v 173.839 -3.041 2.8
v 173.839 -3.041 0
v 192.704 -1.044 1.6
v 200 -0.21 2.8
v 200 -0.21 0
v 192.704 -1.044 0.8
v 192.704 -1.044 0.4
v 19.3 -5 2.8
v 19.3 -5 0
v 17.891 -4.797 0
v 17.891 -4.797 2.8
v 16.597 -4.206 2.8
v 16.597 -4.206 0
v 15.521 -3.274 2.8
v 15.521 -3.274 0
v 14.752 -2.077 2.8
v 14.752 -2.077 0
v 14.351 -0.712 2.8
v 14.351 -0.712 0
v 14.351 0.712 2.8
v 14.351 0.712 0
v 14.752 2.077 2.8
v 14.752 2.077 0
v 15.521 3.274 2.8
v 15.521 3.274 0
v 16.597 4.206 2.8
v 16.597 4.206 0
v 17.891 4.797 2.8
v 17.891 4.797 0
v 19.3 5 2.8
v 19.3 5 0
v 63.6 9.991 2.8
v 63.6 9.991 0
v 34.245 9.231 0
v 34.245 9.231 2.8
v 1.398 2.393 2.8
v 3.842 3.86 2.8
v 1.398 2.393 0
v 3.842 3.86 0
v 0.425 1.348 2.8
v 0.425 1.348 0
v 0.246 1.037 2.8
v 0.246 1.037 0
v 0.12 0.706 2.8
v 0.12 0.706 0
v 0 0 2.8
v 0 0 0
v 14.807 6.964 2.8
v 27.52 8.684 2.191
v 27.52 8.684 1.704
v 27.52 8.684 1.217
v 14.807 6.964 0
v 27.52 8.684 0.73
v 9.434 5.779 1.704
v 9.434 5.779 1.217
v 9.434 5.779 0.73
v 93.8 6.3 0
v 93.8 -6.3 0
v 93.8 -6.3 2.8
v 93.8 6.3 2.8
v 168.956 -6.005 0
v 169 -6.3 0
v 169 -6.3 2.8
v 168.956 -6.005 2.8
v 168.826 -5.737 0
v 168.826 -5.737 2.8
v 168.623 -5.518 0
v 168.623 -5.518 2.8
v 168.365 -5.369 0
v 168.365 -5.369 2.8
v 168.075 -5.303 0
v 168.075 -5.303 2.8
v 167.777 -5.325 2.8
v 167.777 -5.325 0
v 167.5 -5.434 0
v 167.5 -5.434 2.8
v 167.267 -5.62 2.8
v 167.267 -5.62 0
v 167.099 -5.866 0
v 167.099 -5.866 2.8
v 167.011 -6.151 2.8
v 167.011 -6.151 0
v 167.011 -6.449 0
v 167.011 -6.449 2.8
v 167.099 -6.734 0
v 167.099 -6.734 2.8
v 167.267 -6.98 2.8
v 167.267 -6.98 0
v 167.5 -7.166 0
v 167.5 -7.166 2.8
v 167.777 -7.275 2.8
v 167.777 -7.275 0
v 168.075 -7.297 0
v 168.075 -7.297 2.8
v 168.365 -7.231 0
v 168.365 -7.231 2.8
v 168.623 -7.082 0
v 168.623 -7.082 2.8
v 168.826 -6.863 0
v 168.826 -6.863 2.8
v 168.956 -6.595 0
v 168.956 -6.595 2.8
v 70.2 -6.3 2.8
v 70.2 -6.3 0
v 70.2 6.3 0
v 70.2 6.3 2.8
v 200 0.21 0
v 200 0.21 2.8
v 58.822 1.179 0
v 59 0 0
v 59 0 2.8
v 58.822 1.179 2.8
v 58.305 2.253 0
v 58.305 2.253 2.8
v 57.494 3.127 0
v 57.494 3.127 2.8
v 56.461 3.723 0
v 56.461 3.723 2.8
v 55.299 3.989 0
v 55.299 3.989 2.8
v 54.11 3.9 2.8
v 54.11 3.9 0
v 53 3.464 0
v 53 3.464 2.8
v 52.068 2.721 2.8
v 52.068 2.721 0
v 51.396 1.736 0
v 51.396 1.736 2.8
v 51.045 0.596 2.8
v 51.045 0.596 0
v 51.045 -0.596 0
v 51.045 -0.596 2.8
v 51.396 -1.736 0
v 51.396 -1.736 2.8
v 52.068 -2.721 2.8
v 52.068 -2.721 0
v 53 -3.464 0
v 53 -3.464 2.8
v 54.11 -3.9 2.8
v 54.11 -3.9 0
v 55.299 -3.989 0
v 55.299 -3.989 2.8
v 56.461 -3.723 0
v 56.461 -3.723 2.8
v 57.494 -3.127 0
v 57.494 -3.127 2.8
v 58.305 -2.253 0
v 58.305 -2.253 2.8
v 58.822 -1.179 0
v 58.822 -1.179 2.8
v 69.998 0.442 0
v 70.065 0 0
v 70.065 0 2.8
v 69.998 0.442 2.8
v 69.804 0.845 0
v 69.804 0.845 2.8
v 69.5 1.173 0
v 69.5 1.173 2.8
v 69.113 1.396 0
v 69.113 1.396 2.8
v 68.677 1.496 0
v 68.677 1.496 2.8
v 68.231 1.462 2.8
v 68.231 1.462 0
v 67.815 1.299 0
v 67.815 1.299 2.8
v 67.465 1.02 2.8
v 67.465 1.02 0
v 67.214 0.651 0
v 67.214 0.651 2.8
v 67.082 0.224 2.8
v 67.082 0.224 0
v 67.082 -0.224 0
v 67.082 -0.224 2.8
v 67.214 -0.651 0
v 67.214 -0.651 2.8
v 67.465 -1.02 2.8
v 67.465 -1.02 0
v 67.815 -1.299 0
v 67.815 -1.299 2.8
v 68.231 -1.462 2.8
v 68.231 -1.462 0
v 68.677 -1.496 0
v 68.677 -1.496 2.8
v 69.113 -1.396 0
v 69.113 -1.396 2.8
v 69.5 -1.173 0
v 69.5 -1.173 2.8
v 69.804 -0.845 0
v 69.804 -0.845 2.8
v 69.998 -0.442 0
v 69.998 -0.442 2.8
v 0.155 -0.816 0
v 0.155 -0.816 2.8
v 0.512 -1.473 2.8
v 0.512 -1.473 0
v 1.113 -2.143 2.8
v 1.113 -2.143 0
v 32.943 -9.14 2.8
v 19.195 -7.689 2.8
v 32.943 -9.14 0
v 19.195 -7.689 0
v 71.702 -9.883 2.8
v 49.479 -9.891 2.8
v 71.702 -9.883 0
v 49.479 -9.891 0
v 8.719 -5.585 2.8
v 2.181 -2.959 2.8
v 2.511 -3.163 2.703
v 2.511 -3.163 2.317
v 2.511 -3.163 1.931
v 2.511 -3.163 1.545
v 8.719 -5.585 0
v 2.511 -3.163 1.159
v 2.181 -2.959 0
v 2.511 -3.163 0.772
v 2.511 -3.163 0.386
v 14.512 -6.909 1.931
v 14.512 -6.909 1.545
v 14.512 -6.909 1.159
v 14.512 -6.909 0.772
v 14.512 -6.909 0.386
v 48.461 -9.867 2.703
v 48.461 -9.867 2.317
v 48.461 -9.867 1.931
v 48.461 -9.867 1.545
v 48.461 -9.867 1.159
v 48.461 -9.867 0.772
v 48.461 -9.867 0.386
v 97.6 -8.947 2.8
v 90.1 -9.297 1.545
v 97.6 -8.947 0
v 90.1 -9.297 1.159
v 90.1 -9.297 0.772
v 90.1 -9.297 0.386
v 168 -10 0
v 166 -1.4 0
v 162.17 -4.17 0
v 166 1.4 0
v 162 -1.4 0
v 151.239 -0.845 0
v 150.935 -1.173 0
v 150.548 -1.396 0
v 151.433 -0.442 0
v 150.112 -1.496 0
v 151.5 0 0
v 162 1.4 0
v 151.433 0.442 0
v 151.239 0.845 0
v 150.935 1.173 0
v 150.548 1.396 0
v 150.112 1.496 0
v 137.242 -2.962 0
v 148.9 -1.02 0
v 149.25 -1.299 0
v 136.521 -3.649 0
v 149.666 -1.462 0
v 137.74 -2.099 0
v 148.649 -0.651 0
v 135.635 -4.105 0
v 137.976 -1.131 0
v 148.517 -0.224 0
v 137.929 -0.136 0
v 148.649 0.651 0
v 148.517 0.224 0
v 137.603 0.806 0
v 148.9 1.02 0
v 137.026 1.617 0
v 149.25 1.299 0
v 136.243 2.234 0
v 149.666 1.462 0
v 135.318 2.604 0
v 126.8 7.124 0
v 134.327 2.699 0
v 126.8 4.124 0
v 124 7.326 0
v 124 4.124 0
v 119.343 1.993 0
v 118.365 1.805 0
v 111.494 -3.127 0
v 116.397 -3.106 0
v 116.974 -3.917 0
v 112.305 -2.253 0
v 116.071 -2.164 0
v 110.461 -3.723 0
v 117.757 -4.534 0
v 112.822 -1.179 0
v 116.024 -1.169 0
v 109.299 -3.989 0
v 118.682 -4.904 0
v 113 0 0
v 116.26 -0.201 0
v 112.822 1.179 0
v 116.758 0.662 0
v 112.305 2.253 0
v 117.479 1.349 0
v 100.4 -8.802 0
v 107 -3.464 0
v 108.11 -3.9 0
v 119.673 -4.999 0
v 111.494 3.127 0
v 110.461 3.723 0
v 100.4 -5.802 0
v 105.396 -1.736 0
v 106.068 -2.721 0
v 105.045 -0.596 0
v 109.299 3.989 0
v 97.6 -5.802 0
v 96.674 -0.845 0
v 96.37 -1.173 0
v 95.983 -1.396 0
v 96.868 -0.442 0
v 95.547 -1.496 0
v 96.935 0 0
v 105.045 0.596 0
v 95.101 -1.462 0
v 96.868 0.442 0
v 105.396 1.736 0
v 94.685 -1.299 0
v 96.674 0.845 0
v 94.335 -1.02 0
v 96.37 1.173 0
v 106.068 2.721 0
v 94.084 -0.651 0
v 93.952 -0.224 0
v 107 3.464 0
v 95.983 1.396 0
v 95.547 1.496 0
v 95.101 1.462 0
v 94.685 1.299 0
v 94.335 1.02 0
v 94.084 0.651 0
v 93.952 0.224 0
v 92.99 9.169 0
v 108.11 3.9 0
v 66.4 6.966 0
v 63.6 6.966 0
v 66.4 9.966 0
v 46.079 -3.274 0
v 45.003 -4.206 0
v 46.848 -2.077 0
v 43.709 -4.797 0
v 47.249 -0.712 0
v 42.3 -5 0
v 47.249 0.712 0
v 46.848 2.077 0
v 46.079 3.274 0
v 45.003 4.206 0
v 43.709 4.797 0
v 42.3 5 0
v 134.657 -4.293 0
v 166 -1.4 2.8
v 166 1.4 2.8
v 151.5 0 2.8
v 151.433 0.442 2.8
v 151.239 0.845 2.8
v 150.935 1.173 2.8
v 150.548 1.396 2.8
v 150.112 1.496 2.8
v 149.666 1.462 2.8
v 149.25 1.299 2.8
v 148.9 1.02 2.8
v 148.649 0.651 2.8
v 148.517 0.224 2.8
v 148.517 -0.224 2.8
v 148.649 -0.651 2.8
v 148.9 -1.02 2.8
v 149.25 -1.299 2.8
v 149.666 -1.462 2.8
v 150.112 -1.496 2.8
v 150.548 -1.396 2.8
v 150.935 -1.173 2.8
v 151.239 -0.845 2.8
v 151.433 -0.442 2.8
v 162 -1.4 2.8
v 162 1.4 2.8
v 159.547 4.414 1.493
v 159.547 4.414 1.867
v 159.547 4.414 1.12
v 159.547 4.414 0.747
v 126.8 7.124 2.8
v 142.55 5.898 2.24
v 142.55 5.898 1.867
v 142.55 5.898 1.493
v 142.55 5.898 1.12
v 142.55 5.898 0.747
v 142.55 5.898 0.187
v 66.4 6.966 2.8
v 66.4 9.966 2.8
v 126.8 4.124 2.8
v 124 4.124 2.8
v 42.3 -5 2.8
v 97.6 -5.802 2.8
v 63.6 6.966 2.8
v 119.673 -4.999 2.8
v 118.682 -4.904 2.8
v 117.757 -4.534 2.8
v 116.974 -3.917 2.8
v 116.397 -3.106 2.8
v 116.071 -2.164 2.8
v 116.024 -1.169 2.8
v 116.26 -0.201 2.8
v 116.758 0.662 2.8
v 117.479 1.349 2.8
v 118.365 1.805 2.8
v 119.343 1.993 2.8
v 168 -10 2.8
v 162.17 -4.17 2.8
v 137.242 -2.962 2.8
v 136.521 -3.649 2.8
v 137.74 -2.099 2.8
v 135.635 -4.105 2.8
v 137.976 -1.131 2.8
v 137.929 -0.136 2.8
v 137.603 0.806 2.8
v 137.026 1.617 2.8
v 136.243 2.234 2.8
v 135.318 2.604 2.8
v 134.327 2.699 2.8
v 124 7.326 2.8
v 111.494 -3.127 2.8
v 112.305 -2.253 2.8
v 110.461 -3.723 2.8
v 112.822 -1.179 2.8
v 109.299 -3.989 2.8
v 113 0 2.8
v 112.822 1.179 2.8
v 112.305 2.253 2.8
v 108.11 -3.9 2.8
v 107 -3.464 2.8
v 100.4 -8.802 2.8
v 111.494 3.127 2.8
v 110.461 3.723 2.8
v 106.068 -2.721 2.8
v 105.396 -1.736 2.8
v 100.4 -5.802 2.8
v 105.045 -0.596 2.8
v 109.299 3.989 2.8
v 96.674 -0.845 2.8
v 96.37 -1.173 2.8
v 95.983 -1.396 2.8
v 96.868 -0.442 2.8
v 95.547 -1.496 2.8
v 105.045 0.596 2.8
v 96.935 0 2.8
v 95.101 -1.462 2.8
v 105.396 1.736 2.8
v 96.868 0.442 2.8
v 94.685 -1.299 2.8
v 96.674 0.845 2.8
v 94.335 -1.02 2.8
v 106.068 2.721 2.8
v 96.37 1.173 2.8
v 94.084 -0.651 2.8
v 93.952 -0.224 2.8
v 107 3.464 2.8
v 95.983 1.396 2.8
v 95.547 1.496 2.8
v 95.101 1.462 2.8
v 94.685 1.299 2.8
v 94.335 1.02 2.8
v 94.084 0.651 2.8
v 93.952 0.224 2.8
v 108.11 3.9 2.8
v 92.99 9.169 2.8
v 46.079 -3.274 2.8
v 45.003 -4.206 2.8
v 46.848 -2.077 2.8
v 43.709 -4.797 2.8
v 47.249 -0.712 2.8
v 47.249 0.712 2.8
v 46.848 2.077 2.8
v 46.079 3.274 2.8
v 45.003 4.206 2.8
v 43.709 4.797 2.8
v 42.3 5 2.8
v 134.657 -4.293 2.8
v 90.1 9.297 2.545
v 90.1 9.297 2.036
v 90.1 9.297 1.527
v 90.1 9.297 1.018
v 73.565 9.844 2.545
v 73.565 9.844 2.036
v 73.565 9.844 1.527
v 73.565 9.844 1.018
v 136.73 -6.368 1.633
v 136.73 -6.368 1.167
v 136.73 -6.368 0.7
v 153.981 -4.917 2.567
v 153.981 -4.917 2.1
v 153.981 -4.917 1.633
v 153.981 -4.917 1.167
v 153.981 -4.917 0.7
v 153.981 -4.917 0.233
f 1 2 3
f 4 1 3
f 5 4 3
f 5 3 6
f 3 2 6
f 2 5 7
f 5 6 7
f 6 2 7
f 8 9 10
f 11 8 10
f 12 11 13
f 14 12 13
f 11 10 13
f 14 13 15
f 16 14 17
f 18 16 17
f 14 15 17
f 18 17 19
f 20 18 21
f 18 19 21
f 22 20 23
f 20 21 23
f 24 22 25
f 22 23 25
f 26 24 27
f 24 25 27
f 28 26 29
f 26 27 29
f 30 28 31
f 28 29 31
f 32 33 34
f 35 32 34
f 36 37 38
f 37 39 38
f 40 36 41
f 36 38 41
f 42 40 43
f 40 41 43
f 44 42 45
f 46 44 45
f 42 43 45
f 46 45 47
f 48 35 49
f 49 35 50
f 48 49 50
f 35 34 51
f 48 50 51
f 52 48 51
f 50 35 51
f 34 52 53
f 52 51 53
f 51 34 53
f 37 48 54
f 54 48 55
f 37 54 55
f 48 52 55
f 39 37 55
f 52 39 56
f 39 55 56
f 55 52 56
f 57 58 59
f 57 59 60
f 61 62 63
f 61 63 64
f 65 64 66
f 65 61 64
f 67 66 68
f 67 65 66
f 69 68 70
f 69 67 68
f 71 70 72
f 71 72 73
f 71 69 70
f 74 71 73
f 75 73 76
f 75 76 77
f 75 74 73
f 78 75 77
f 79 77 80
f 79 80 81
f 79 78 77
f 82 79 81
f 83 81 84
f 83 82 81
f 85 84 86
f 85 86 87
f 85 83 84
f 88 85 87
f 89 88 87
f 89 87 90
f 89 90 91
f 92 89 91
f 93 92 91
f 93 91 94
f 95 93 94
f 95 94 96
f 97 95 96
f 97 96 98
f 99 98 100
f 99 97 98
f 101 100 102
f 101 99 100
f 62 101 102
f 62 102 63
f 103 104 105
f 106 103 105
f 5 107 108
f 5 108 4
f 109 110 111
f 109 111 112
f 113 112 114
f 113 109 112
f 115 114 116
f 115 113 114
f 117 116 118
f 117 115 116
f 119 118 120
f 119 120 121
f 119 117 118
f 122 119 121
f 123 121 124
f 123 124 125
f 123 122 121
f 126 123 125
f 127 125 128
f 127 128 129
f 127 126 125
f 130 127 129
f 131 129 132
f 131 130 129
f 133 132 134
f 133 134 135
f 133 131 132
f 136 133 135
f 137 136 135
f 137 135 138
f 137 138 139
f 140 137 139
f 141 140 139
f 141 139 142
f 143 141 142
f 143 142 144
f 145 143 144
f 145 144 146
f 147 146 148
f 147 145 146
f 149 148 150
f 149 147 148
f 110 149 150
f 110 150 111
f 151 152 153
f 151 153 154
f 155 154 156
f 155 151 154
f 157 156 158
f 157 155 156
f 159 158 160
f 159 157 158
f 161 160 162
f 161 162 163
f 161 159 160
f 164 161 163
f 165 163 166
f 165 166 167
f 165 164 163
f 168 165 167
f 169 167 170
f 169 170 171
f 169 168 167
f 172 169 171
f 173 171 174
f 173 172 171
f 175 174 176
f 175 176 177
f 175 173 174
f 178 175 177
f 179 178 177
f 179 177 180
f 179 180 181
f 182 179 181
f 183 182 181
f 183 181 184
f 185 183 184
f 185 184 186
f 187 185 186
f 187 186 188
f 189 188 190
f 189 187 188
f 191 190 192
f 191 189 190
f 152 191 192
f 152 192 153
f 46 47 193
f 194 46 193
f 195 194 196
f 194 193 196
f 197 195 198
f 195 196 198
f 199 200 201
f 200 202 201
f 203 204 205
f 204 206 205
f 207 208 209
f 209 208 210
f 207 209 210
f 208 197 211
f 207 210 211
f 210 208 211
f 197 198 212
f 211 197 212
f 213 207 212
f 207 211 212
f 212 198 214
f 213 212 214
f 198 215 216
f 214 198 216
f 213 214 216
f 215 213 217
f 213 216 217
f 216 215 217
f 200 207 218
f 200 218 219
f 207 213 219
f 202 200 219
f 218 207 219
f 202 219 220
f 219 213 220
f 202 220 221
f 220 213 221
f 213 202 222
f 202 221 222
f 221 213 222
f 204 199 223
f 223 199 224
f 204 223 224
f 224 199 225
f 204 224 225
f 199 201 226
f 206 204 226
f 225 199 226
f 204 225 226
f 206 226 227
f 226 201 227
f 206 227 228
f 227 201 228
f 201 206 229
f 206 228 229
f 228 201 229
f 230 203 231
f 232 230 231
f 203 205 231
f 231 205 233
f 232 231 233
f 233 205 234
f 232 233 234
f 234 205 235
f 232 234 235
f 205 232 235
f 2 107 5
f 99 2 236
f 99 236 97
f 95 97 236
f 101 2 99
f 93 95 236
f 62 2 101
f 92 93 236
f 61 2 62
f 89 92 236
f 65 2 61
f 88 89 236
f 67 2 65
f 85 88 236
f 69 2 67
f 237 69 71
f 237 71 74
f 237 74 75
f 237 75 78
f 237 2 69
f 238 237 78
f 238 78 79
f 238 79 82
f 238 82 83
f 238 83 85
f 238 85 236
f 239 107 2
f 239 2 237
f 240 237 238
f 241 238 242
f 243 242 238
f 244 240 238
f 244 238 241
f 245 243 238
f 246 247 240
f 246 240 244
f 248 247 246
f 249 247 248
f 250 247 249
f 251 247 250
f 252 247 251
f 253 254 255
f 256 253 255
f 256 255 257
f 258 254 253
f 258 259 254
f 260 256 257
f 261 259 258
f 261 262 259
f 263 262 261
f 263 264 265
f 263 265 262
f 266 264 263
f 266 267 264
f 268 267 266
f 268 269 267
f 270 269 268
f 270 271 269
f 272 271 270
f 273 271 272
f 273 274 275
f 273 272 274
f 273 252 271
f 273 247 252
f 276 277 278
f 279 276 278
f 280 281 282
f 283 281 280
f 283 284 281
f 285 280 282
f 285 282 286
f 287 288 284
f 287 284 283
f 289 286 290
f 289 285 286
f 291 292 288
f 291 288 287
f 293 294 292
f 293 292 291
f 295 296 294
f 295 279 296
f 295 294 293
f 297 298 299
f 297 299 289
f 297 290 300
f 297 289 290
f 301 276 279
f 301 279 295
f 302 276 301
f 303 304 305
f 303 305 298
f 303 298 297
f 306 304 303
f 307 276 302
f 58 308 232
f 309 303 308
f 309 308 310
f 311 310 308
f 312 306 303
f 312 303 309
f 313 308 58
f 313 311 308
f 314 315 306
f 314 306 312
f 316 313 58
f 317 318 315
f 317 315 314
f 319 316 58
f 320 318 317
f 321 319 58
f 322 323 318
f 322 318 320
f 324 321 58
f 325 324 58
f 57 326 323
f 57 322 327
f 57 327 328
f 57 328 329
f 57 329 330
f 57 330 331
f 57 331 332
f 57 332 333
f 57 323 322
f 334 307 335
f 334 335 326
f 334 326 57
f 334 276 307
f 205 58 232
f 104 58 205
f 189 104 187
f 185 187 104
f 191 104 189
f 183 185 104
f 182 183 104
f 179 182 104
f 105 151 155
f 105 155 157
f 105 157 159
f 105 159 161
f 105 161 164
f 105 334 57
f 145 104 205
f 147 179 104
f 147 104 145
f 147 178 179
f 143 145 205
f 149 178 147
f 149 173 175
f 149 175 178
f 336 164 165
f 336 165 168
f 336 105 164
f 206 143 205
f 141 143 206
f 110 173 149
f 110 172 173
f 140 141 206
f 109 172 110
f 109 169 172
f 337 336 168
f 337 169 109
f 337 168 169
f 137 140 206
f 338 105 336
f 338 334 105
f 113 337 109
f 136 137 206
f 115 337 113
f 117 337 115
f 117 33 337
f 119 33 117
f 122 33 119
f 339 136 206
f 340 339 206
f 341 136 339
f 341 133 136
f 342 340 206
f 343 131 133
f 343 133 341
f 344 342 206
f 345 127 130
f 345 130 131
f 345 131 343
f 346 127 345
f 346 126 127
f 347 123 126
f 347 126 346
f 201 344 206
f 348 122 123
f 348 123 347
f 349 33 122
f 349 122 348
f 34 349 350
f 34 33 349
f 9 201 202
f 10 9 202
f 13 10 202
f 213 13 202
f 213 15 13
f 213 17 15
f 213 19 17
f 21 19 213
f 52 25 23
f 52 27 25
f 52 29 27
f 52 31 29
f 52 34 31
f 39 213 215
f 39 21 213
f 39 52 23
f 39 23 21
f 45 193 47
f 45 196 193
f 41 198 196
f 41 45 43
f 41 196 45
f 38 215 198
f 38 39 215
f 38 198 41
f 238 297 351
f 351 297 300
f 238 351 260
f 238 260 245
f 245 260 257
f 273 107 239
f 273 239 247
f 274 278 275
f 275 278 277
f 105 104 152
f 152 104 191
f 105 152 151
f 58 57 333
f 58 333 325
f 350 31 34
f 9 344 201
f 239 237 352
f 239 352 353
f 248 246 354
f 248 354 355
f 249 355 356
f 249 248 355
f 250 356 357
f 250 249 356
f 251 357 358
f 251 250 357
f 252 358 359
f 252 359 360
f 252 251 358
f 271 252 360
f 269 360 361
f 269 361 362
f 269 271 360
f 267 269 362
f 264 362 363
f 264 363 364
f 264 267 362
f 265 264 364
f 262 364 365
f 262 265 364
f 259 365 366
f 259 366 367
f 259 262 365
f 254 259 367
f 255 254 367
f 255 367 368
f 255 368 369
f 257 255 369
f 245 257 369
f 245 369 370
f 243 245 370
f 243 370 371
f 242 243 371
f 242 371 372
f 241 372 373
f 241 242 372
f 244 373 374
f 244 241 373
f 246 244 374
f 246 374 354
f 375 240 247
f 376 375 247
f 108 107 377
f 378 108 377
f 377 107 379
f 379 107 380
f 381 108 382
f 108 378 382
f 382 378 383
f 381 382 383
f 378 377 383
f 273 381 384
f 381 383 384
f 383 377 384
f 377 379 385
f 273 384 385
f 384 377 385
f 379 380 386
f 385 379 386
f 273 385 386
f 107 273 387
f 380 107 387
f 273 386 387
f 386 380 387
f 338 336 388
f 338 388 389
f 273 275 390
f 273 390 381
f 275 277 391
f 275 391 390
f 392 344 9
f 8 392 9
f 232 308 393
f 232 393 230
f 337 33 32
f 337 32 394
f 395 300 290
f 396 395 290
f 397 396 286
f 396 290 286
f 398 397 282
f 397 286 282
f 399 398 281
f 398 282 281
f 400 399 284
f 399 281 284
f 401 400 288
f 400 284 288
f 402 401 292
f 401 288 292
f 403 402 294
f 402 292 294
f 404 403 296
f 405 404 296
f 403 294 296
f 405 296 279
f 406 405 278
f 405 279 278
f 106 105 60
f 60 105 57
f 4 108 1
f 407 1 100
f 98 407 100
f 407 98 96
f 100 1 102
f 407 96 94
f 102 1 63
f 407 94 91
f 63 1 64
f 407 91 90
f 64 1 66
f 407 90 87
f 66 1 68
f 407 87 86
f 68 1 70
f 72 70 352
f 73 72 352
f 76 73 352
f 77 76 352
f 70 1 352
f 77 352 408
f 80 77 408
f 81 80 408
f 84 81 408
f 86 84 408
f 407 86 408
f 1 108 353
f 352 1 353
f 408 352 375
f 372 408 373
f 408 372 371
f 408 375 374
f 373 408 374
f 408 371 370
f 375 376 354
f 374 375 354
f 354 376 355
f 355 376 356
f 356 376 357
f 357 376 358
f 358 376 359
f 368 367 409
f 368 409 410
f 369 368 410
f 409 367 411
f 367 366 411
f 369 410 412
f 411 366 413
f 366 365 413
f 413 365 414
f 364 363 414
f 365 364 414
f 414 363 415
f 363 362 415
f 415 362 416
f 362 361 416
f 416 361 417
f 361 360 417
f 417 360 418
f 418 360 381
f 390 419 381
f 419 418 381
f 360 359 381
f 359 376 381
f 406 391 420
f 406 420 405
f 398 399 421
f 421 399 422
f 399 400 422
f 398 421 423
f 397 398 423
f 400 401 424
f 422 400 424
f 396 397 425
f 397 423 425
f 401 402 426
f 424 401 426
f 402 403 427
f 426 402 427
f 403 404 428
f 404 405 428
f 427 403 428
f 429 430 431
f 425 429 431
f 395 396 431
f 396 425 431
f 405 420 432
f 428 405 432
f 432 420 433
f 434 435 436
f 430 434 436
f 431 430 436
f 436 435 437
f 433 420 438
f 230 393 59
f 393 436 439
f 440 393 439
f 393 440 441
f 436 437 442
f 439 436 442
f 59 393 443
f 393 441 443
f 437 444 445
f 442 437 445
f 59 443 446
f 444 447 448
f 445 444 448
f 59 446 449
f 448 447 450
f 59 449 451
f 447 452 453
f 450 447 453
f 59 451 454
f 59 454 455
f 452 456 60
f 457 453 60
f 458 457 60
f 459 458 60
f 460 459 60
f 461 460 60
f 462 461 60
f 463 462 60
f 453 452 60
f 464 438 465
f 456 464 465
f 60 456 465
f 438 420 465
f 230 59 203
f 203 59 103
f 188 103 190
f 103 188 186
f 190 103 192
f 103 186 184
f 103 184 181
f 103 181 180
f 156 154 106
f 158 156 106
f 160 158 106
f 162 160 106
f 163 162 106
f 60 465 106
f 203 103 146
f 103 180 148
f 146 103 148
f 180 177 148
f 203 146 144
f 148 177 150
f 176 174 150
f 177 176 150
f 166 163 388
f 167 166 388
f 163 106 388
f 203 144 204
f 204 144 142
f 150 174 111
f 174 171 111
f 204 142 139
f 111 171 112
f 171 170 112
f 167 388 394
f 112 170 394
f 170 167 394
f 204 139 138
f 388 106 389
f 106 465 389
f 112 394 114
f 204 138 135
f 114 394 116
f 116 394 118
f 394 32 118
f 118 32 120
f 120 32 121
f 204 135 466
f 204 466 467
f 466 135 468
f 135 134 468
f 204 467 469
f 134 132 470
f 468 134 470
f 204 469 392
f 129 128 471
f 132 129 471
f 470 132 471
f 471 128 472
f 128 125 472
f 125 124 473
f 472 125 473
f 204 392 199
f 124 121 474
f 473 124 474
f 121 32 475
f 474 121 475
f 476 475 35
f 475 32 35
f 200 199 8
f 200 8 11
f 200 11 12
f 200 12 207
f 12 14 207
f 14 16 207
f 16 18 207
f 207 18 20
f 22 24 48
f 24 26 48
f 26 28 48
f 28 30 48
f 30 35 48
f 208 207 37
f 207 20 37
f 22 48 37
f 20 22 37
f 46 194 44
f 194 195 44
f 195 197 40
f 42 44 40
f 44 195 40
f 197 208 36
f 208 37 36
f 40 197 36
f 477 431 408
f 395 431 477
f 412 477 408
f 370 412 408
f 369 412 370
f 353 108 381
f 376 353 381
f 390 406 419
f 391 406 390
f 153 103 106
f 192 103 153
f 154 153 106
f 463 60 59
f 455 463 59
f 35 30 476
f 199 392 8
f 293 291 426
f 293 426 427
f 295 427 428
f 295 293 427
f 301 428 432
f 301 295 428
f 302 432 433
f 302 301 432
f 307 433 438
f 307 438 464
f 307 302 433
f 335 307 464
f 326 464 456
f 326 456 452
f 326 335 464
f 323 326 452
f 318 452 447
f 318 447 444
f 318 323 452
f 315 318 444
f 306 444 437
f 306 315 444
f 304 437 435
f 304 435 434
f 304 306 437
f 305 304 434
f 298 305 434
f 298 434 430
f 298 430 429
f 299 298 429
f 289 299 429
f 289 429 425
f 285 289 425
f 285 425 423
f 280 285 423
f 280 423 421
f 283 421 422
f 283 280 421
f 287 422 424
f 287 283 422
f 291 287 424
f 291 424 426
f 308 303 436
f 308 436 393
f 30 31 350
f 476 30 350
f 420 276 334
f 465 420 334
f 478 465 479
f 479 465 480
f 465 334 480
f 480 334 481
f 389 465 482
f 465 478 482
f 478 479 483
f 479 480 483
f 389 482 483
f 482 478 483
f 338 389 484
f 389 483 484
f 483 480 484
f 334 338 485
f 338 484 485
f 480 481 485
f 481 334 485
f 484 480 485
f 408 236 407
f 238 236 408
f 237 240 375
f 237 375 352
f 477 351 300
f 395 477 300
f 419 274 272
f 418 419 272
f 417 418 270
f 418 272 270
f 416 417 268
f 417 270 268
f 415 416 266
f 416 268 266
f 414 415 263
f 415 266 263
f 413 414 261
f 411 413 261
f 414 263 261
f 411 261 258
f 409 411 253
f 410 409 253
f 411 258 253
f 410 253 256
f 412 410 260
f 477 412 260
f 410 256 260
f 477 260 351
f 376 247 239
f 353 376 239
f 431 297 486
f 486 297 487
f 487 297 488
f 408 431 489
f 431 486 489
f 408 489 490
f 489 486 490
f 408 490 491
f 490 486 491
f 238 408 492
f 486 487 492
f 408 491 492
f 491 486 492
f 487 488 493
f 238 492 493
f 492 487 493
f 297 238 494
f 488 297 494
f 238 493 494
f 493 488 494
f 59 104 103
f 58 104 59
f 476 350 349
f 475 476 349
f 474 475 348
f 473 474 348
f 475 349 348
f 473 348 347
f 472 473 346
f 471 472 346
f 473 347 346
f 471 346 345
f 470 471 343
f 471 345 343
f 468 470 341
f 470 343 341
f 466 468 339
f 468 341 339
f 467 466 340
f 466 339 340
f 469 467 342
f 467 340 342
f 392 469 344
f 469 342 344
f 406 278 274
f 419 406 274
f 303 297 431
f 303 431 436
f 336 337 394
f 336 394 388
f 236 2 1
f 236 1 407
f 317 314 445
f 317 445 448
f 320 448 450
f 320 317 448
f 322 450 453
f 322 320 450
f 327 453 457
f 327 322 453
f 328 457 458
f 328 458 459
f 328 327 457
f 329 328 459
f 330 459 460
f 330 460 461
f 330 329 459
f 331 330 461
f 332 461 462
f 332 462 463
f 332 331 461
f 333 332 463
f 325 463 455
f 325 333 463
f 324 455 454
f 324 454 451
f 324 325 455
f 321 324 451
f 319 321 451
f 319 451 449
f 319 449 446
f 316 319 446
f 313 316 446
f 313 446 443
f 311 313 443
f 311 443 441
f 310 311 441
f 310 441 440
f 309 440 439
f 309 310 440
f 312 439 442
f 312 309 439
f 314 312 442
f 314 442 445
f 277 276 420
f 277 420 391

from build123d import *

# Parameters (mm, degrees)
SKETCH_3_R      = 4
SKETCH_3_R_2    = 1.5
SKETCH_3_R_3    = 1
SKETCH_3_W      = 23.6
SKETCH_3_H      = 12.6
SKETCH_3_W_2    = 4
SKETCH_3_H_2    = 2.8
EXTRUDE_3_DEPTH = 2.8


with BuildPart() as part:
    # Эскиз3 → Бобышка-Вытянуть3 (new body)
    with BuildSketch(Plane.XY):
        with BuildLine():
            Line((200, 0.21), (200, -0.21))
            add(Edge.make_bspline(
                [(173.839461144, -3.040801203), (175.943333039, -2.830170954), (179.564023078, -2.461029339), (184.58704572, -1.932479181), (188.771568451, -1.480695182), (192.530784687, -1.065063842), (195.747560944, -0.701689979), (198.179524953, -0.422303954), (199.520051416, -0.265971644), (200, -0.21)],
                knots=[0.870307302, 0.870307302, 0.870307302, 0.870307302, 0.901571134, 0.924121062, 0.944988816, 0.963803939, 0.980044339, 0.992855276, 1, 1, 1, 1], degree=3))
            Line((173.839461144, -3.040801203), (168, -10))
            Line((168, -10), (162.170244806, -4.170244806))
            add(Edge.make_bspline(
                [(100.4, -8.802264), (100.782530515, -8.78200637), (103.102887785, -8.657921344), (107.374551667, -8.416266925), (113.223109349, -8.057497647), (119.097620698, -7.671146294), (124.98256269, -7.259840679), (130.861479372, -6.826169971), (136.716836604, -6.372892076), (142.52985565, -5.902766003), (148.280267017, -5.418602057), (153.94609331, -4.923426646), (158.566687276, -4.50520567), (161.295968592, -4.251994411), (162.170244806, -4.170244806)],
                knots=[0.507199784, 0.507199784, 0.507199784, 0.507199784, 0.512863887, 0.541558094, 0.570462313, 0.599504248, 0.628607349, 0.657690446, 0.686667237, 0.715444849, 0.743923546, 0.77199483, 0.799540253, 0.812523886, 0.812523886, 0.812523886, 0.812523886], degree=3))
            Line((100.4, -8.802264), (100.4, -5.802264))
            Line((100.4, -5.802264), (97.6, -5.802264))
            Line((97.6, -5.802264), (97.6, -8.946938935))
            add(Edge.make_bspline(
                [(0, 0), (0.032444913, -0.278495812), (0.100633198, -0.863800259), (0.62379252, -1.678905598), (1.407454518, -2.445359098), (2.48215991, -3.178007515), (3.831515725, -3.88154028), (5.45639967, -4.556541724), (7.350195056, -5.201638101), (9.507426038, -5.81478546), (11.921305119, -6.393879384), (14.58489291, -6.936612431), (17.490877441, -7.44078362), (20.631718928, -7.904294519), (23.999672572, -8.325205071), (27.586779877, -8.701741845), (31.384869897, -9.032475932), (35.385580653, -9.316092874), (39.580313292, -9.551735955), (43.960263434, -9.738807032), (48.51637403, -9.877065972), (53.239340889, -9.96650448), (58.119580475, -10.007674079), (63.147232299, -10.001179647), (68.312112852, -9.948180779), (73.603706202, -9.849984193), (79.011121778, -9.708185508), (84.52309051, -9.524657051), (90.127882502, -9.301433286), (94.497039971, -9.101072496), (96.996632606, -8.97732649), (97.6, -8.946938935)],
                knots=[0, 0, 0, 0, 0.004099011, 0.008614742, 0.013934855, 0.020277775, 0.027752981, 0.036410215, 0.046266433, 0.057320238, 0.069558946, 0.082962861, 0.097507218, 0.113164082, 0.12990269, 0.147690304, 0.166492185, 0.186271967, 0.206991861, 0.228612215, 0.251092165, 0.274388983, 0.298458209, 0.323253842, 0.348727971, 0.374830387, 0.40150919, 0.428710016, 0.456376154, 0.484448083, 0.493380908, 0.493380908, 0.493380908, 0.493380908], degree=3))
            add(Edge.make_bspline(
                [(63.6, 9.990751447), (63.433767139, 9.991846739), (61.590618822, 10.003190391), (58.119580475, 10.007674079), (53.239340889, 9.96650448), (48.51637403, 9.877065972), (43.960263434, 9.738807032), (39.580313292, 9.551735955), (35.385580653, 9.316092874), (31.384869897, 9.032475932), (27.586779877, 8.701741845), (23.999672572, 8.325205071), (20.631718928, 7.904294519), (17.490877441, 7.44078362), (14.58489291, 6.936612431), (11.921305119, 6.393879384), (9.507426038, 5.81478546), (7.350195056, 5.201638101), (5.45639967, 4.556541724), (3.831515725, 3.88154028), (2.48215991, 3.178007515), (1.407454518, 2.445359098), (0.62379252, 1.678905598), (0.100633198, 0.863800259), (0.032444913, 0.278495812), (0, 0)],
                knots=[0.674288155, 0.674288155, 0.674288155, 0.674288155, 0.676746158, 0.701541791, 0.725611017, 0.748907835, 0.771387785, 0.793008139, 0.813728033, 0.833507815, 0.852309696, 0.87009731, 0.886835918, 0.902492782, 0.917037139, 0.930441054, 0.942679762, 0.953733567, 0.963589785, 0.972247019, 0.979722225, 0.986065145, 0.991385258, 0.995900989, 1, 1, 1, 1], degree=3))
            Line((63.6, 9.990751447), (63.6, 6.965595937))
            Line((63.6, 6.965595937), (66.4, 6.965595937))
            Line((66.4, 6.965595937), (66.4, 9.965595937))
            add(Edge.make_bspline(
                [(124, 7.326294797), (122.364596134, 7.442700413), (118.769611386, 7.692718614), (113.223109349, 8.057497647), (107.374551667, 8.416266925), (101.566628903, 8.744829808), (95.813307617, 9.040711105), (90.127882502, 9.301433286), (84.52309051, 9.524657051), (79.011121778, 9.708185508), (73.603706202, 9.849984193), (69.41154014, 9.927778606), (67.023185068, 9.958531818), (66.4, 9.965595937)],
                knots=[0.376253135, 0.376253135, 0.376253135, 0.376253135, 0.400495752, 0.429537687, 0.458441906, 0.487136113, 0.515551917, 0.543623846, 0.571289984, 0.59849081, 0.625169613, 0.651272029, 0.660487149, 0.660487149, 0.660487149, 0.660487149], degree=3))
            Line((124, 7.326294797), (124, 4.124412105))
            Line((124, 4.124412105), (126.8, 4.124412105))
            Line((126.8, 4.124412105), (126.8, 7.124412105))
            add(Edge.make_bspline(
                [(200, 0.21), (199.520051416, 0.265971644), (198.179524953, 0.422303954), (195.747560944, 0.701689979), (192.530784687, 1.065063842), (188.771568451, 1.480695182), (184.58704572, 1.932479181), (180.05616868, 2.409243063), (175.238405485, 2.90257428), (168.371896377, 3.585728287), (161.260104983, 4.261418012), (153.94609331, 4.923426646), (148.280267017, 5.418602057), (142.52985565, 5.902766003), (136.716836604, 6.372892076), (131.466708661, 6.779317653), (128.156255998, 7.025385403), (126.8, 7.124412105)],
                knots=[0, 0, 0, 0, 0.007144724, 0.019955661, 0.036196061, 0.055011184, 0.075878938, 0.098428866, 0.122375554, 0.147487885, 0.200459747, 0.22800517, 0.256076454, 0.284555151, 0.313332763, 0.342309554, 0.362416837, 0.362416837, 0.362416837, 0.362416837], degree=3))
        make_face()
        with Locations((109, 0)):
            Circle(SKETCH_3_R, mode=Mode.SUBTRACT)
        with Locations((55, 0)):
            Circle(SKETCH_3_R, mode=Mode.SUBTRACT)
        with Locations((150, 0)):
            Circle(SKETCH_3_R_2, mode=Mode.SUBTRACT)
        with Locations((68.565, 0)):
            Circle(SKETCH_3_R_2, mode=Mode.SUBTRACT)
        with Locations((95.435, 0)):
            Circle(SKETCH_3_R_2, mode=Mode.SUBTRACT)
        with Locations((168, -6.3)):
            Circle(SKETCH_3_R_3, mode=Mode.SUBTRACT)
        with BuildLine():
            Line((19.3, 5), (42.3, 5))
            ThreePointArc((42.3, 5), (47.3, 0), (42.3, -5))
            Line((42.3, -5), (19.3, -5))
            ThreePointArc((19.3, -5), (14.3, 0), (19.3, 5))
        make_face(mode=Mode.SUBTRACT)
        with BuildLine():
            Line((119.34345336, 1.992816182), (134.326801485, 2.699412943))
            ThreePointArc((134.326801485, 2.699412943), (137.987788625, -0.631829042), (134.65654664, -4.292816182))
            Line((134.65654664, -4.292816182), (119.673198515, -4.999412943))
            ThreePointArc((119.673198515, -4.999412943), (116.012211375, -1.668170958), (119.34345336, 1.992816182))
        make_face(mode=Mode.SUBTRACT)
        with Locations((82, 0)):
            Rectangle(SKETCH_3_W, SKETCH_3_H, mode=Mode.SUBTRACT)
        with Locations((164, 0)):
            Rectangle(SKETCH_3_W_2, SKETCH_3_H_2, mode=Mode.SUBTRACT)
    extrude(amount=EXTRUDE_3_DEPTH)


solid = part.part
